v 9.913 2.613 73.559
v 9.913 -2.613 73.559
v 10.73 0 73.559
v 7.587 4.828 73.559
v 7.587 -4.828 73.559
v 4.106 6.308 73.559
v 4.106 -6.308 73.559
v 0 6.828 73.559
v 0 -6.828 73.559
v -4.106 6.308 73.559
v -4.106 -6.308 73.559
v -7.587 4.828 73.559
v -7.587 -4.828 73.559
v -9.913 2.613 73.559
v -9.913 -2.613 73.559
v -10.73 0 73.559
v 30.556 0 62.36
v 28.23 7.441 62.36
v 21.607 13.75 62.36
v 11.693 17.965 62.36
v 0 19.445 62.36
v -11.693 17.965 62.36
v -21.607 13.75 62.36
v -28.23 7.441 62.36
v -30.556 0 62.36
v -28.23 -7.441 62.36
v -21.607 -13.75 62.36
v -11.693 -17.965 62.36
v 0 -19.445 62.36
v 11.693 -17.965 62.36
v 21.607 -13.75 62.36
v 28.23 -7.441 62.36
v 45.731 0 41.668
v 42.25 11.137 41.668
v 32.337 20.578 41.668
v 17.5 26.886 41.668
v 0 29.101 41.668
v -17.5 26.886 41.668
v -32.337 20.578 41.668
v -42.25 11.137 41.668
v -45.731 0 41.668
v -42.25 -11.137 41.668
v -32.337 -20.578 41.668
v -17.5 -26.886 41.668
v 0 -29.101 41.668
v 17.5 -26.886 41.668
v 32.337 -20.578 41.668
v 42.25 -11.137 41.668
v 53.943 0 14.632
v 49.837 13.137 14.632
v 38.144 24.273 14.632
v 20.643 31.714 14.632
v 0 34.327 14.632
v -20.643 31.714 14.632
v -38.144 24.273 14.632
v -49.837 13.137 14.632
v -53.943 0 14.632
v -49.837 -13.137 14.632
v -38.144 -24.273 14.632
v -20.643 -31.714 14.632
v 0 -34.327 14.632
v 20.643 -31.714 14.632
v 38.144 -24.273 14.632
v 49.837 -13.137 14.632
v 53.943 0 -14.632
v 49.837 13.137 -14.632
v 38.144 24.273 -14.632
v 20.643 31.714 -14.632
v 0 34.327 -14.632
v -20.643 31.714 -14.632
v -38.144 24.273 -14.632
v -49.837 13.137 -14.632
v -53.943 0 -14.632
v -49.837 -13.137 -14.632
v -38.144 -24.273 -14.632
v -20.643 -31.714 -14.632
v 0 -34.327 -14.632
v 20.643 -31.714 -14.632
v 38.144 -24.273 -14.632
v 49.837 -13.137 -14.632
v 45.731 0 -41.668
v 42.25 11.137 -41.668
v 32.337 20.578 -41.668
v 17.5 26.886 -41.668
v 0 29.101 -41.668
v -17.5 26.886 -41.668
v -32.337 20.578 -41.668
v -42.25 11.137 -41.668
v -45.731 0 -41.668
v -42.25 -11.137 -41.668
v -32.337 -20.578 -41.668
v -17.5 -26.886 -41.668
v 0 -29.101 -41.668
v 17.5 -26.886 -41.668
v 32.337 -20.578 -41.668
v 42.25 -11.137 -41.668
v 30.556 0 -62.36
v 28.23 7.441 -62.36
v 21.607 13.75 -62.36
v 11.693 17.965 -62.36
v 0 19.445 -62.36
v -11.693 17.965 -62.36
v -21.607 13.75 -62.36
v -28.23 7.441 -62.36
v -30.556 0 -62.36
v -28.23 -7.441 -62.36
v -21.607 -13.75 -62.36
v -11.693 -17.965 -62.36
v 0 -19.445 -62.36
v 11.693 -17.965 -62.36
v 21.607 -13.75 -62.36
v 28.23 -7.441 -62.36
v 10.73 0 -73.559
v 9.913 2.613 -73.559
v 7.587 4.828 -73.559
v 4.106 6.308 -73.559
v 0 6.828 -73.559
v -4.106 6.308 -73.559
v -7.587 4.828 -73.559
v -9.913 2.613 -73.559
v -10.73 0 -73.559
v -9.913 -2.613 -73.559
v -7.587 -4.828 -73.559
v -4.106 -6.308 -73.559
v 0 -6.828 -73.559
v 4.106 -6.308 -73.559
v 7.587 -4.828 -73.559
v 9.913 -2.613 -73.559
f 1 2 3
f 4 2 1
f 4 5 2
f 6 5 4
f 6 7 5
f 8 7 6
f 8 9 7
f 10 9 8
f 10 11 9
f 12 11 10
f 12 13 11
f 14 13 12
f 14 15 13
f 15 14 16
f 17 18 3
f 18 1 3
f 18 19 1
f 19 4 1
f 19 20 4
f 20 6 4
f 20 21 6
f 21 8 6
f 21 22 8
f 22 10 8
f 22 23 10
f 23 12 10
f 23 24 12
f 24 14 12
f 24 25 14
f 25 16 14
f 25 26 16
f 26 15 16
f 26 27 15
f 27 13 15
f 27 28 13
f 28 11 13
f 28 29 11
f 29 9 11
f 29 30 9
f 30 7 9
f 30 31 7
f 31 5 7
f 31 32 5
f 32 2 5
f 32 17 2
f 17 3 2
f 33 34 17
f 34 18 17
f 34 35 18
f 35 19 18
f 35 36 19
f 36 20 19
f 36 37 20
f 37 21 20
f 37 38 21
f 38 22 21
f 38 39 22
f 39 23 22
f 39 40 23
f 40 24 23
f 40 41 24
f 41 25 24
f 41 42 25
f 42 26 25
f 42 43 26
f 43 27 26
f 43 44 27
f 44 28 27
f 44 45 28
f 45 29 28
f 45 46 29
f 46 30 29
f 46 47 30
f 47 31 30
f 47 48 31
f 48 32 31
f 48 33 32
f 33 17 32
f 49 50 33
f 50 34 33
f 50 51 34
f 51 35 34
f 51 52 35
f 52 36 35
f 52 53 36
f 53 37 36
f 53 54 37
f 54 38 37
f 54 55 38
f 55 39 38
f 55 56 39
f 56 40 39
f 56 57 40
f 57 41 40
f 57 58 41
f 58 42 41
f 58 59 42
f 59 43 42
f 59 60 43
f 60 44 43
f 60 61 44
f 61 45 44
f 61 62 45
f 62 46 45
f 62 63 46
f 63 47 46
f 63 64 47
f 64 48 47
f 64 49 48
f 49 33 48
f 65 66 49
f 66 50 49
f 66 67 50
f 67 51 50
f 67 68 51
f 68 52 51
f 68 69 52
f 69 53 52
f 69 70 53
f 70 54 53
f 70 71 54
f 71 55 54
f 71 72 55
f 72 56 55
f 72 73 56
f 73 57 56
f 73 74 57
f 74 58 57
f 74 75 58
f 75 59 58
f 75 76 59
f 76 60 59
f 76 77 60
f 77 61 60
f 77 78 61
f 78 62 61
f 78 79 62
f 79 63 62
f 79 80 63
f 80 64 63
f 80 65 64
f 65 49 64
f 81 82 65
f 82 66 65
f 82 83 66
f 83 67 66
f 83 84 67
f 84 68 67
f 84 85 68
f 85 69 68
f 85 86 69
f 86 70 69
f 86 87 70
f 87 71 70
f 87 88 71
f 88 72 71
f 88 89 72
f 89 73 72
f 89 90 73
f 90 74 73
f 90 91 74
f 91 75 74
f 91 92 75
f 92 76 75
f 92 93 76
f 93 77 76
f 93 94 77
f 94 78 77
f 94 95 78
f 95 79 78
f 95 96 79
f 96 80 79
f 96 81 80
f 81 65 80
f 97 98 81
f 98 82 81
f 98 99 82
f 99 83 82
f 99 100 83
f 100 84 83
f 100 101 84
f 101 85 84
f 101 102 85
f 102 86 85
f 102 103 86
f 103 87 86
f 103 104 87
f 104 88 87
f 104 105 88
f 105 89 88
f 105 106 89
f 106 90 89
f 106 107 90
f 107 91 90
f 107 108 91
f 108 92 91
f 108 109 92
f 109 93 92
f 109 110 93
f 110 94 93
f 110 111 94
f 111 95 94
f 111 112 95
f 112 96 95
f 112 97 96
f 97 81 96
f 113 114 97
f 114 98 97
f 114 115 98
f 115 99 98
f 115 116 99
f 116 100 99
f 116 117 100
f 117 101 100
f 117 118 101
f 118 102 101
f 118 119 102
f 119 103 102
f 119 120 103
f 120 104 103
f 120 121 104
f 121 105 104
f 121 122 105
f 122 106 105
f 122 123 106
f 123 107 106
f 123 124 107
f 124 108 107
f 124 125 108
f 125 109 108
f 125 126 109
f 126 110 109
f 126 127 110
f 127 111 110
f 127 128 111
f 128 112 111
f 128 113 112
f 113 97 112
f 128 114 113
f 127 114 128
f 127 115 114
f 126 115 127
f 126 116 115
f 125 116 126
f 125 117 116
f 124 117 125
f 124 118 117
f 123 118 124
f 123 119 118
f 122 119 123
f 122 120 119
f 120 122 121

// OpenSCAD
// Generated by SolidPython 1.0.1 on 2020-07-29 00:46:49


scale(v = [11, 7, 15]) {
	sphere(r = 5);
}
/***********************************************
*********      SolidPython code:      **********
************************************************
 
# import packages: SolidPython
from solid import *
from solid.utils import *
from itertools import chain, combinations, permutations


class Resize:

    def __init__(self, scad_file):
        self.scad_file = scad_file
        #self.scad_file = import_scad(scad_file)
        # cone/cylinder param:
        self.r1 = 0
        self.r2 = 0
        self.h = 0
        # rectangular prism param:
        self.w = 0
        self.l = 0
        # ellipse param:
        self.r = 0

    # import OpenScad code (file name corresponds to shape)


    # classify shape + parameters
    def assign(self, param1, param2, param3):
        if self.scad_file == 'cone.scad':
            self.r1 = param1
            self.r2 = param2
            self.h = param3
        elif self.scad_file == 'cylinder.scad':
            self.r1 = param1
            self.r2 = param2
            self.h = param3
        elif self.scad_file == 'rectangularPrism.scad':
            self.h = param1
            self.l = param2
            self.w = param3
        else:
            self.r = param1
            self.h = param2

    # resize parameters
    def iterate(self):
        x = range(3, 20, 2)
        i = 1
        if self.scad_file == 'cone.scad':
            tempList = list(permutations(x, 2))
            for temp in tempList:
                param1 = temp[0]
                param2 = temp[1]
                filepath = 'produced_scad_files/' + 'cone' + str(param1) + '_' + str(param2) + '_' + '.scad'
                scad_render_to_file(cylinder(h=param1, r1=param2, r2=0), filepath)

        elif self.scad_file == 'cylinder.scad':
            tempList = list(permutations(x, 3))
            for temp in tempList:
                param1 = temp[0]
                param2 = temp[1]
                filepath = 'produced_scad_files/' + 'cylinder' + str(param1) + '_' + str(param2) + '_' + '.scad'
                scad_render_to_file(cylinder(h=param1, r1=param2, r2=param2), filepath)

        elif self.scad_file == 'rectangularPrism.scad':
            tempList = list(permutations(x, 3))
            for temp in tempList:
                param1 = temp[0]
                param2 = temp[1]
                param3 = temp[2]
                filepath = 'produced_scad_files/' + 'rectangularPrism' + str(param1) + '_' + str(param2) + '_' + str(
                    param3) + '.scad'
                scad_render_to_file(cube(size=(param1, param2, param3)), filepath)

        elif self.scad_file == 'ellipse.scad':
            tempList = list(permutations(x, 4))
            for temp in tempList:
                param1 = temp[0]
                param2 = temp[1]
                param3 = temp[2]
                param4 = temp[3]
                filepath = 'produced_scad_files/' + 'ellipse' + str(param1) + '_' + str(param2) + '_' + str(param3) + '_' + str(param4) + '.scad'
                scad_render_to_file(scale([param1, param2, param3])(sphere(r=param4)), filepath)

    def render_to_scadfile(self):
        scad_render_to_file(scad, 'example.scad') 
 
************************************************/
